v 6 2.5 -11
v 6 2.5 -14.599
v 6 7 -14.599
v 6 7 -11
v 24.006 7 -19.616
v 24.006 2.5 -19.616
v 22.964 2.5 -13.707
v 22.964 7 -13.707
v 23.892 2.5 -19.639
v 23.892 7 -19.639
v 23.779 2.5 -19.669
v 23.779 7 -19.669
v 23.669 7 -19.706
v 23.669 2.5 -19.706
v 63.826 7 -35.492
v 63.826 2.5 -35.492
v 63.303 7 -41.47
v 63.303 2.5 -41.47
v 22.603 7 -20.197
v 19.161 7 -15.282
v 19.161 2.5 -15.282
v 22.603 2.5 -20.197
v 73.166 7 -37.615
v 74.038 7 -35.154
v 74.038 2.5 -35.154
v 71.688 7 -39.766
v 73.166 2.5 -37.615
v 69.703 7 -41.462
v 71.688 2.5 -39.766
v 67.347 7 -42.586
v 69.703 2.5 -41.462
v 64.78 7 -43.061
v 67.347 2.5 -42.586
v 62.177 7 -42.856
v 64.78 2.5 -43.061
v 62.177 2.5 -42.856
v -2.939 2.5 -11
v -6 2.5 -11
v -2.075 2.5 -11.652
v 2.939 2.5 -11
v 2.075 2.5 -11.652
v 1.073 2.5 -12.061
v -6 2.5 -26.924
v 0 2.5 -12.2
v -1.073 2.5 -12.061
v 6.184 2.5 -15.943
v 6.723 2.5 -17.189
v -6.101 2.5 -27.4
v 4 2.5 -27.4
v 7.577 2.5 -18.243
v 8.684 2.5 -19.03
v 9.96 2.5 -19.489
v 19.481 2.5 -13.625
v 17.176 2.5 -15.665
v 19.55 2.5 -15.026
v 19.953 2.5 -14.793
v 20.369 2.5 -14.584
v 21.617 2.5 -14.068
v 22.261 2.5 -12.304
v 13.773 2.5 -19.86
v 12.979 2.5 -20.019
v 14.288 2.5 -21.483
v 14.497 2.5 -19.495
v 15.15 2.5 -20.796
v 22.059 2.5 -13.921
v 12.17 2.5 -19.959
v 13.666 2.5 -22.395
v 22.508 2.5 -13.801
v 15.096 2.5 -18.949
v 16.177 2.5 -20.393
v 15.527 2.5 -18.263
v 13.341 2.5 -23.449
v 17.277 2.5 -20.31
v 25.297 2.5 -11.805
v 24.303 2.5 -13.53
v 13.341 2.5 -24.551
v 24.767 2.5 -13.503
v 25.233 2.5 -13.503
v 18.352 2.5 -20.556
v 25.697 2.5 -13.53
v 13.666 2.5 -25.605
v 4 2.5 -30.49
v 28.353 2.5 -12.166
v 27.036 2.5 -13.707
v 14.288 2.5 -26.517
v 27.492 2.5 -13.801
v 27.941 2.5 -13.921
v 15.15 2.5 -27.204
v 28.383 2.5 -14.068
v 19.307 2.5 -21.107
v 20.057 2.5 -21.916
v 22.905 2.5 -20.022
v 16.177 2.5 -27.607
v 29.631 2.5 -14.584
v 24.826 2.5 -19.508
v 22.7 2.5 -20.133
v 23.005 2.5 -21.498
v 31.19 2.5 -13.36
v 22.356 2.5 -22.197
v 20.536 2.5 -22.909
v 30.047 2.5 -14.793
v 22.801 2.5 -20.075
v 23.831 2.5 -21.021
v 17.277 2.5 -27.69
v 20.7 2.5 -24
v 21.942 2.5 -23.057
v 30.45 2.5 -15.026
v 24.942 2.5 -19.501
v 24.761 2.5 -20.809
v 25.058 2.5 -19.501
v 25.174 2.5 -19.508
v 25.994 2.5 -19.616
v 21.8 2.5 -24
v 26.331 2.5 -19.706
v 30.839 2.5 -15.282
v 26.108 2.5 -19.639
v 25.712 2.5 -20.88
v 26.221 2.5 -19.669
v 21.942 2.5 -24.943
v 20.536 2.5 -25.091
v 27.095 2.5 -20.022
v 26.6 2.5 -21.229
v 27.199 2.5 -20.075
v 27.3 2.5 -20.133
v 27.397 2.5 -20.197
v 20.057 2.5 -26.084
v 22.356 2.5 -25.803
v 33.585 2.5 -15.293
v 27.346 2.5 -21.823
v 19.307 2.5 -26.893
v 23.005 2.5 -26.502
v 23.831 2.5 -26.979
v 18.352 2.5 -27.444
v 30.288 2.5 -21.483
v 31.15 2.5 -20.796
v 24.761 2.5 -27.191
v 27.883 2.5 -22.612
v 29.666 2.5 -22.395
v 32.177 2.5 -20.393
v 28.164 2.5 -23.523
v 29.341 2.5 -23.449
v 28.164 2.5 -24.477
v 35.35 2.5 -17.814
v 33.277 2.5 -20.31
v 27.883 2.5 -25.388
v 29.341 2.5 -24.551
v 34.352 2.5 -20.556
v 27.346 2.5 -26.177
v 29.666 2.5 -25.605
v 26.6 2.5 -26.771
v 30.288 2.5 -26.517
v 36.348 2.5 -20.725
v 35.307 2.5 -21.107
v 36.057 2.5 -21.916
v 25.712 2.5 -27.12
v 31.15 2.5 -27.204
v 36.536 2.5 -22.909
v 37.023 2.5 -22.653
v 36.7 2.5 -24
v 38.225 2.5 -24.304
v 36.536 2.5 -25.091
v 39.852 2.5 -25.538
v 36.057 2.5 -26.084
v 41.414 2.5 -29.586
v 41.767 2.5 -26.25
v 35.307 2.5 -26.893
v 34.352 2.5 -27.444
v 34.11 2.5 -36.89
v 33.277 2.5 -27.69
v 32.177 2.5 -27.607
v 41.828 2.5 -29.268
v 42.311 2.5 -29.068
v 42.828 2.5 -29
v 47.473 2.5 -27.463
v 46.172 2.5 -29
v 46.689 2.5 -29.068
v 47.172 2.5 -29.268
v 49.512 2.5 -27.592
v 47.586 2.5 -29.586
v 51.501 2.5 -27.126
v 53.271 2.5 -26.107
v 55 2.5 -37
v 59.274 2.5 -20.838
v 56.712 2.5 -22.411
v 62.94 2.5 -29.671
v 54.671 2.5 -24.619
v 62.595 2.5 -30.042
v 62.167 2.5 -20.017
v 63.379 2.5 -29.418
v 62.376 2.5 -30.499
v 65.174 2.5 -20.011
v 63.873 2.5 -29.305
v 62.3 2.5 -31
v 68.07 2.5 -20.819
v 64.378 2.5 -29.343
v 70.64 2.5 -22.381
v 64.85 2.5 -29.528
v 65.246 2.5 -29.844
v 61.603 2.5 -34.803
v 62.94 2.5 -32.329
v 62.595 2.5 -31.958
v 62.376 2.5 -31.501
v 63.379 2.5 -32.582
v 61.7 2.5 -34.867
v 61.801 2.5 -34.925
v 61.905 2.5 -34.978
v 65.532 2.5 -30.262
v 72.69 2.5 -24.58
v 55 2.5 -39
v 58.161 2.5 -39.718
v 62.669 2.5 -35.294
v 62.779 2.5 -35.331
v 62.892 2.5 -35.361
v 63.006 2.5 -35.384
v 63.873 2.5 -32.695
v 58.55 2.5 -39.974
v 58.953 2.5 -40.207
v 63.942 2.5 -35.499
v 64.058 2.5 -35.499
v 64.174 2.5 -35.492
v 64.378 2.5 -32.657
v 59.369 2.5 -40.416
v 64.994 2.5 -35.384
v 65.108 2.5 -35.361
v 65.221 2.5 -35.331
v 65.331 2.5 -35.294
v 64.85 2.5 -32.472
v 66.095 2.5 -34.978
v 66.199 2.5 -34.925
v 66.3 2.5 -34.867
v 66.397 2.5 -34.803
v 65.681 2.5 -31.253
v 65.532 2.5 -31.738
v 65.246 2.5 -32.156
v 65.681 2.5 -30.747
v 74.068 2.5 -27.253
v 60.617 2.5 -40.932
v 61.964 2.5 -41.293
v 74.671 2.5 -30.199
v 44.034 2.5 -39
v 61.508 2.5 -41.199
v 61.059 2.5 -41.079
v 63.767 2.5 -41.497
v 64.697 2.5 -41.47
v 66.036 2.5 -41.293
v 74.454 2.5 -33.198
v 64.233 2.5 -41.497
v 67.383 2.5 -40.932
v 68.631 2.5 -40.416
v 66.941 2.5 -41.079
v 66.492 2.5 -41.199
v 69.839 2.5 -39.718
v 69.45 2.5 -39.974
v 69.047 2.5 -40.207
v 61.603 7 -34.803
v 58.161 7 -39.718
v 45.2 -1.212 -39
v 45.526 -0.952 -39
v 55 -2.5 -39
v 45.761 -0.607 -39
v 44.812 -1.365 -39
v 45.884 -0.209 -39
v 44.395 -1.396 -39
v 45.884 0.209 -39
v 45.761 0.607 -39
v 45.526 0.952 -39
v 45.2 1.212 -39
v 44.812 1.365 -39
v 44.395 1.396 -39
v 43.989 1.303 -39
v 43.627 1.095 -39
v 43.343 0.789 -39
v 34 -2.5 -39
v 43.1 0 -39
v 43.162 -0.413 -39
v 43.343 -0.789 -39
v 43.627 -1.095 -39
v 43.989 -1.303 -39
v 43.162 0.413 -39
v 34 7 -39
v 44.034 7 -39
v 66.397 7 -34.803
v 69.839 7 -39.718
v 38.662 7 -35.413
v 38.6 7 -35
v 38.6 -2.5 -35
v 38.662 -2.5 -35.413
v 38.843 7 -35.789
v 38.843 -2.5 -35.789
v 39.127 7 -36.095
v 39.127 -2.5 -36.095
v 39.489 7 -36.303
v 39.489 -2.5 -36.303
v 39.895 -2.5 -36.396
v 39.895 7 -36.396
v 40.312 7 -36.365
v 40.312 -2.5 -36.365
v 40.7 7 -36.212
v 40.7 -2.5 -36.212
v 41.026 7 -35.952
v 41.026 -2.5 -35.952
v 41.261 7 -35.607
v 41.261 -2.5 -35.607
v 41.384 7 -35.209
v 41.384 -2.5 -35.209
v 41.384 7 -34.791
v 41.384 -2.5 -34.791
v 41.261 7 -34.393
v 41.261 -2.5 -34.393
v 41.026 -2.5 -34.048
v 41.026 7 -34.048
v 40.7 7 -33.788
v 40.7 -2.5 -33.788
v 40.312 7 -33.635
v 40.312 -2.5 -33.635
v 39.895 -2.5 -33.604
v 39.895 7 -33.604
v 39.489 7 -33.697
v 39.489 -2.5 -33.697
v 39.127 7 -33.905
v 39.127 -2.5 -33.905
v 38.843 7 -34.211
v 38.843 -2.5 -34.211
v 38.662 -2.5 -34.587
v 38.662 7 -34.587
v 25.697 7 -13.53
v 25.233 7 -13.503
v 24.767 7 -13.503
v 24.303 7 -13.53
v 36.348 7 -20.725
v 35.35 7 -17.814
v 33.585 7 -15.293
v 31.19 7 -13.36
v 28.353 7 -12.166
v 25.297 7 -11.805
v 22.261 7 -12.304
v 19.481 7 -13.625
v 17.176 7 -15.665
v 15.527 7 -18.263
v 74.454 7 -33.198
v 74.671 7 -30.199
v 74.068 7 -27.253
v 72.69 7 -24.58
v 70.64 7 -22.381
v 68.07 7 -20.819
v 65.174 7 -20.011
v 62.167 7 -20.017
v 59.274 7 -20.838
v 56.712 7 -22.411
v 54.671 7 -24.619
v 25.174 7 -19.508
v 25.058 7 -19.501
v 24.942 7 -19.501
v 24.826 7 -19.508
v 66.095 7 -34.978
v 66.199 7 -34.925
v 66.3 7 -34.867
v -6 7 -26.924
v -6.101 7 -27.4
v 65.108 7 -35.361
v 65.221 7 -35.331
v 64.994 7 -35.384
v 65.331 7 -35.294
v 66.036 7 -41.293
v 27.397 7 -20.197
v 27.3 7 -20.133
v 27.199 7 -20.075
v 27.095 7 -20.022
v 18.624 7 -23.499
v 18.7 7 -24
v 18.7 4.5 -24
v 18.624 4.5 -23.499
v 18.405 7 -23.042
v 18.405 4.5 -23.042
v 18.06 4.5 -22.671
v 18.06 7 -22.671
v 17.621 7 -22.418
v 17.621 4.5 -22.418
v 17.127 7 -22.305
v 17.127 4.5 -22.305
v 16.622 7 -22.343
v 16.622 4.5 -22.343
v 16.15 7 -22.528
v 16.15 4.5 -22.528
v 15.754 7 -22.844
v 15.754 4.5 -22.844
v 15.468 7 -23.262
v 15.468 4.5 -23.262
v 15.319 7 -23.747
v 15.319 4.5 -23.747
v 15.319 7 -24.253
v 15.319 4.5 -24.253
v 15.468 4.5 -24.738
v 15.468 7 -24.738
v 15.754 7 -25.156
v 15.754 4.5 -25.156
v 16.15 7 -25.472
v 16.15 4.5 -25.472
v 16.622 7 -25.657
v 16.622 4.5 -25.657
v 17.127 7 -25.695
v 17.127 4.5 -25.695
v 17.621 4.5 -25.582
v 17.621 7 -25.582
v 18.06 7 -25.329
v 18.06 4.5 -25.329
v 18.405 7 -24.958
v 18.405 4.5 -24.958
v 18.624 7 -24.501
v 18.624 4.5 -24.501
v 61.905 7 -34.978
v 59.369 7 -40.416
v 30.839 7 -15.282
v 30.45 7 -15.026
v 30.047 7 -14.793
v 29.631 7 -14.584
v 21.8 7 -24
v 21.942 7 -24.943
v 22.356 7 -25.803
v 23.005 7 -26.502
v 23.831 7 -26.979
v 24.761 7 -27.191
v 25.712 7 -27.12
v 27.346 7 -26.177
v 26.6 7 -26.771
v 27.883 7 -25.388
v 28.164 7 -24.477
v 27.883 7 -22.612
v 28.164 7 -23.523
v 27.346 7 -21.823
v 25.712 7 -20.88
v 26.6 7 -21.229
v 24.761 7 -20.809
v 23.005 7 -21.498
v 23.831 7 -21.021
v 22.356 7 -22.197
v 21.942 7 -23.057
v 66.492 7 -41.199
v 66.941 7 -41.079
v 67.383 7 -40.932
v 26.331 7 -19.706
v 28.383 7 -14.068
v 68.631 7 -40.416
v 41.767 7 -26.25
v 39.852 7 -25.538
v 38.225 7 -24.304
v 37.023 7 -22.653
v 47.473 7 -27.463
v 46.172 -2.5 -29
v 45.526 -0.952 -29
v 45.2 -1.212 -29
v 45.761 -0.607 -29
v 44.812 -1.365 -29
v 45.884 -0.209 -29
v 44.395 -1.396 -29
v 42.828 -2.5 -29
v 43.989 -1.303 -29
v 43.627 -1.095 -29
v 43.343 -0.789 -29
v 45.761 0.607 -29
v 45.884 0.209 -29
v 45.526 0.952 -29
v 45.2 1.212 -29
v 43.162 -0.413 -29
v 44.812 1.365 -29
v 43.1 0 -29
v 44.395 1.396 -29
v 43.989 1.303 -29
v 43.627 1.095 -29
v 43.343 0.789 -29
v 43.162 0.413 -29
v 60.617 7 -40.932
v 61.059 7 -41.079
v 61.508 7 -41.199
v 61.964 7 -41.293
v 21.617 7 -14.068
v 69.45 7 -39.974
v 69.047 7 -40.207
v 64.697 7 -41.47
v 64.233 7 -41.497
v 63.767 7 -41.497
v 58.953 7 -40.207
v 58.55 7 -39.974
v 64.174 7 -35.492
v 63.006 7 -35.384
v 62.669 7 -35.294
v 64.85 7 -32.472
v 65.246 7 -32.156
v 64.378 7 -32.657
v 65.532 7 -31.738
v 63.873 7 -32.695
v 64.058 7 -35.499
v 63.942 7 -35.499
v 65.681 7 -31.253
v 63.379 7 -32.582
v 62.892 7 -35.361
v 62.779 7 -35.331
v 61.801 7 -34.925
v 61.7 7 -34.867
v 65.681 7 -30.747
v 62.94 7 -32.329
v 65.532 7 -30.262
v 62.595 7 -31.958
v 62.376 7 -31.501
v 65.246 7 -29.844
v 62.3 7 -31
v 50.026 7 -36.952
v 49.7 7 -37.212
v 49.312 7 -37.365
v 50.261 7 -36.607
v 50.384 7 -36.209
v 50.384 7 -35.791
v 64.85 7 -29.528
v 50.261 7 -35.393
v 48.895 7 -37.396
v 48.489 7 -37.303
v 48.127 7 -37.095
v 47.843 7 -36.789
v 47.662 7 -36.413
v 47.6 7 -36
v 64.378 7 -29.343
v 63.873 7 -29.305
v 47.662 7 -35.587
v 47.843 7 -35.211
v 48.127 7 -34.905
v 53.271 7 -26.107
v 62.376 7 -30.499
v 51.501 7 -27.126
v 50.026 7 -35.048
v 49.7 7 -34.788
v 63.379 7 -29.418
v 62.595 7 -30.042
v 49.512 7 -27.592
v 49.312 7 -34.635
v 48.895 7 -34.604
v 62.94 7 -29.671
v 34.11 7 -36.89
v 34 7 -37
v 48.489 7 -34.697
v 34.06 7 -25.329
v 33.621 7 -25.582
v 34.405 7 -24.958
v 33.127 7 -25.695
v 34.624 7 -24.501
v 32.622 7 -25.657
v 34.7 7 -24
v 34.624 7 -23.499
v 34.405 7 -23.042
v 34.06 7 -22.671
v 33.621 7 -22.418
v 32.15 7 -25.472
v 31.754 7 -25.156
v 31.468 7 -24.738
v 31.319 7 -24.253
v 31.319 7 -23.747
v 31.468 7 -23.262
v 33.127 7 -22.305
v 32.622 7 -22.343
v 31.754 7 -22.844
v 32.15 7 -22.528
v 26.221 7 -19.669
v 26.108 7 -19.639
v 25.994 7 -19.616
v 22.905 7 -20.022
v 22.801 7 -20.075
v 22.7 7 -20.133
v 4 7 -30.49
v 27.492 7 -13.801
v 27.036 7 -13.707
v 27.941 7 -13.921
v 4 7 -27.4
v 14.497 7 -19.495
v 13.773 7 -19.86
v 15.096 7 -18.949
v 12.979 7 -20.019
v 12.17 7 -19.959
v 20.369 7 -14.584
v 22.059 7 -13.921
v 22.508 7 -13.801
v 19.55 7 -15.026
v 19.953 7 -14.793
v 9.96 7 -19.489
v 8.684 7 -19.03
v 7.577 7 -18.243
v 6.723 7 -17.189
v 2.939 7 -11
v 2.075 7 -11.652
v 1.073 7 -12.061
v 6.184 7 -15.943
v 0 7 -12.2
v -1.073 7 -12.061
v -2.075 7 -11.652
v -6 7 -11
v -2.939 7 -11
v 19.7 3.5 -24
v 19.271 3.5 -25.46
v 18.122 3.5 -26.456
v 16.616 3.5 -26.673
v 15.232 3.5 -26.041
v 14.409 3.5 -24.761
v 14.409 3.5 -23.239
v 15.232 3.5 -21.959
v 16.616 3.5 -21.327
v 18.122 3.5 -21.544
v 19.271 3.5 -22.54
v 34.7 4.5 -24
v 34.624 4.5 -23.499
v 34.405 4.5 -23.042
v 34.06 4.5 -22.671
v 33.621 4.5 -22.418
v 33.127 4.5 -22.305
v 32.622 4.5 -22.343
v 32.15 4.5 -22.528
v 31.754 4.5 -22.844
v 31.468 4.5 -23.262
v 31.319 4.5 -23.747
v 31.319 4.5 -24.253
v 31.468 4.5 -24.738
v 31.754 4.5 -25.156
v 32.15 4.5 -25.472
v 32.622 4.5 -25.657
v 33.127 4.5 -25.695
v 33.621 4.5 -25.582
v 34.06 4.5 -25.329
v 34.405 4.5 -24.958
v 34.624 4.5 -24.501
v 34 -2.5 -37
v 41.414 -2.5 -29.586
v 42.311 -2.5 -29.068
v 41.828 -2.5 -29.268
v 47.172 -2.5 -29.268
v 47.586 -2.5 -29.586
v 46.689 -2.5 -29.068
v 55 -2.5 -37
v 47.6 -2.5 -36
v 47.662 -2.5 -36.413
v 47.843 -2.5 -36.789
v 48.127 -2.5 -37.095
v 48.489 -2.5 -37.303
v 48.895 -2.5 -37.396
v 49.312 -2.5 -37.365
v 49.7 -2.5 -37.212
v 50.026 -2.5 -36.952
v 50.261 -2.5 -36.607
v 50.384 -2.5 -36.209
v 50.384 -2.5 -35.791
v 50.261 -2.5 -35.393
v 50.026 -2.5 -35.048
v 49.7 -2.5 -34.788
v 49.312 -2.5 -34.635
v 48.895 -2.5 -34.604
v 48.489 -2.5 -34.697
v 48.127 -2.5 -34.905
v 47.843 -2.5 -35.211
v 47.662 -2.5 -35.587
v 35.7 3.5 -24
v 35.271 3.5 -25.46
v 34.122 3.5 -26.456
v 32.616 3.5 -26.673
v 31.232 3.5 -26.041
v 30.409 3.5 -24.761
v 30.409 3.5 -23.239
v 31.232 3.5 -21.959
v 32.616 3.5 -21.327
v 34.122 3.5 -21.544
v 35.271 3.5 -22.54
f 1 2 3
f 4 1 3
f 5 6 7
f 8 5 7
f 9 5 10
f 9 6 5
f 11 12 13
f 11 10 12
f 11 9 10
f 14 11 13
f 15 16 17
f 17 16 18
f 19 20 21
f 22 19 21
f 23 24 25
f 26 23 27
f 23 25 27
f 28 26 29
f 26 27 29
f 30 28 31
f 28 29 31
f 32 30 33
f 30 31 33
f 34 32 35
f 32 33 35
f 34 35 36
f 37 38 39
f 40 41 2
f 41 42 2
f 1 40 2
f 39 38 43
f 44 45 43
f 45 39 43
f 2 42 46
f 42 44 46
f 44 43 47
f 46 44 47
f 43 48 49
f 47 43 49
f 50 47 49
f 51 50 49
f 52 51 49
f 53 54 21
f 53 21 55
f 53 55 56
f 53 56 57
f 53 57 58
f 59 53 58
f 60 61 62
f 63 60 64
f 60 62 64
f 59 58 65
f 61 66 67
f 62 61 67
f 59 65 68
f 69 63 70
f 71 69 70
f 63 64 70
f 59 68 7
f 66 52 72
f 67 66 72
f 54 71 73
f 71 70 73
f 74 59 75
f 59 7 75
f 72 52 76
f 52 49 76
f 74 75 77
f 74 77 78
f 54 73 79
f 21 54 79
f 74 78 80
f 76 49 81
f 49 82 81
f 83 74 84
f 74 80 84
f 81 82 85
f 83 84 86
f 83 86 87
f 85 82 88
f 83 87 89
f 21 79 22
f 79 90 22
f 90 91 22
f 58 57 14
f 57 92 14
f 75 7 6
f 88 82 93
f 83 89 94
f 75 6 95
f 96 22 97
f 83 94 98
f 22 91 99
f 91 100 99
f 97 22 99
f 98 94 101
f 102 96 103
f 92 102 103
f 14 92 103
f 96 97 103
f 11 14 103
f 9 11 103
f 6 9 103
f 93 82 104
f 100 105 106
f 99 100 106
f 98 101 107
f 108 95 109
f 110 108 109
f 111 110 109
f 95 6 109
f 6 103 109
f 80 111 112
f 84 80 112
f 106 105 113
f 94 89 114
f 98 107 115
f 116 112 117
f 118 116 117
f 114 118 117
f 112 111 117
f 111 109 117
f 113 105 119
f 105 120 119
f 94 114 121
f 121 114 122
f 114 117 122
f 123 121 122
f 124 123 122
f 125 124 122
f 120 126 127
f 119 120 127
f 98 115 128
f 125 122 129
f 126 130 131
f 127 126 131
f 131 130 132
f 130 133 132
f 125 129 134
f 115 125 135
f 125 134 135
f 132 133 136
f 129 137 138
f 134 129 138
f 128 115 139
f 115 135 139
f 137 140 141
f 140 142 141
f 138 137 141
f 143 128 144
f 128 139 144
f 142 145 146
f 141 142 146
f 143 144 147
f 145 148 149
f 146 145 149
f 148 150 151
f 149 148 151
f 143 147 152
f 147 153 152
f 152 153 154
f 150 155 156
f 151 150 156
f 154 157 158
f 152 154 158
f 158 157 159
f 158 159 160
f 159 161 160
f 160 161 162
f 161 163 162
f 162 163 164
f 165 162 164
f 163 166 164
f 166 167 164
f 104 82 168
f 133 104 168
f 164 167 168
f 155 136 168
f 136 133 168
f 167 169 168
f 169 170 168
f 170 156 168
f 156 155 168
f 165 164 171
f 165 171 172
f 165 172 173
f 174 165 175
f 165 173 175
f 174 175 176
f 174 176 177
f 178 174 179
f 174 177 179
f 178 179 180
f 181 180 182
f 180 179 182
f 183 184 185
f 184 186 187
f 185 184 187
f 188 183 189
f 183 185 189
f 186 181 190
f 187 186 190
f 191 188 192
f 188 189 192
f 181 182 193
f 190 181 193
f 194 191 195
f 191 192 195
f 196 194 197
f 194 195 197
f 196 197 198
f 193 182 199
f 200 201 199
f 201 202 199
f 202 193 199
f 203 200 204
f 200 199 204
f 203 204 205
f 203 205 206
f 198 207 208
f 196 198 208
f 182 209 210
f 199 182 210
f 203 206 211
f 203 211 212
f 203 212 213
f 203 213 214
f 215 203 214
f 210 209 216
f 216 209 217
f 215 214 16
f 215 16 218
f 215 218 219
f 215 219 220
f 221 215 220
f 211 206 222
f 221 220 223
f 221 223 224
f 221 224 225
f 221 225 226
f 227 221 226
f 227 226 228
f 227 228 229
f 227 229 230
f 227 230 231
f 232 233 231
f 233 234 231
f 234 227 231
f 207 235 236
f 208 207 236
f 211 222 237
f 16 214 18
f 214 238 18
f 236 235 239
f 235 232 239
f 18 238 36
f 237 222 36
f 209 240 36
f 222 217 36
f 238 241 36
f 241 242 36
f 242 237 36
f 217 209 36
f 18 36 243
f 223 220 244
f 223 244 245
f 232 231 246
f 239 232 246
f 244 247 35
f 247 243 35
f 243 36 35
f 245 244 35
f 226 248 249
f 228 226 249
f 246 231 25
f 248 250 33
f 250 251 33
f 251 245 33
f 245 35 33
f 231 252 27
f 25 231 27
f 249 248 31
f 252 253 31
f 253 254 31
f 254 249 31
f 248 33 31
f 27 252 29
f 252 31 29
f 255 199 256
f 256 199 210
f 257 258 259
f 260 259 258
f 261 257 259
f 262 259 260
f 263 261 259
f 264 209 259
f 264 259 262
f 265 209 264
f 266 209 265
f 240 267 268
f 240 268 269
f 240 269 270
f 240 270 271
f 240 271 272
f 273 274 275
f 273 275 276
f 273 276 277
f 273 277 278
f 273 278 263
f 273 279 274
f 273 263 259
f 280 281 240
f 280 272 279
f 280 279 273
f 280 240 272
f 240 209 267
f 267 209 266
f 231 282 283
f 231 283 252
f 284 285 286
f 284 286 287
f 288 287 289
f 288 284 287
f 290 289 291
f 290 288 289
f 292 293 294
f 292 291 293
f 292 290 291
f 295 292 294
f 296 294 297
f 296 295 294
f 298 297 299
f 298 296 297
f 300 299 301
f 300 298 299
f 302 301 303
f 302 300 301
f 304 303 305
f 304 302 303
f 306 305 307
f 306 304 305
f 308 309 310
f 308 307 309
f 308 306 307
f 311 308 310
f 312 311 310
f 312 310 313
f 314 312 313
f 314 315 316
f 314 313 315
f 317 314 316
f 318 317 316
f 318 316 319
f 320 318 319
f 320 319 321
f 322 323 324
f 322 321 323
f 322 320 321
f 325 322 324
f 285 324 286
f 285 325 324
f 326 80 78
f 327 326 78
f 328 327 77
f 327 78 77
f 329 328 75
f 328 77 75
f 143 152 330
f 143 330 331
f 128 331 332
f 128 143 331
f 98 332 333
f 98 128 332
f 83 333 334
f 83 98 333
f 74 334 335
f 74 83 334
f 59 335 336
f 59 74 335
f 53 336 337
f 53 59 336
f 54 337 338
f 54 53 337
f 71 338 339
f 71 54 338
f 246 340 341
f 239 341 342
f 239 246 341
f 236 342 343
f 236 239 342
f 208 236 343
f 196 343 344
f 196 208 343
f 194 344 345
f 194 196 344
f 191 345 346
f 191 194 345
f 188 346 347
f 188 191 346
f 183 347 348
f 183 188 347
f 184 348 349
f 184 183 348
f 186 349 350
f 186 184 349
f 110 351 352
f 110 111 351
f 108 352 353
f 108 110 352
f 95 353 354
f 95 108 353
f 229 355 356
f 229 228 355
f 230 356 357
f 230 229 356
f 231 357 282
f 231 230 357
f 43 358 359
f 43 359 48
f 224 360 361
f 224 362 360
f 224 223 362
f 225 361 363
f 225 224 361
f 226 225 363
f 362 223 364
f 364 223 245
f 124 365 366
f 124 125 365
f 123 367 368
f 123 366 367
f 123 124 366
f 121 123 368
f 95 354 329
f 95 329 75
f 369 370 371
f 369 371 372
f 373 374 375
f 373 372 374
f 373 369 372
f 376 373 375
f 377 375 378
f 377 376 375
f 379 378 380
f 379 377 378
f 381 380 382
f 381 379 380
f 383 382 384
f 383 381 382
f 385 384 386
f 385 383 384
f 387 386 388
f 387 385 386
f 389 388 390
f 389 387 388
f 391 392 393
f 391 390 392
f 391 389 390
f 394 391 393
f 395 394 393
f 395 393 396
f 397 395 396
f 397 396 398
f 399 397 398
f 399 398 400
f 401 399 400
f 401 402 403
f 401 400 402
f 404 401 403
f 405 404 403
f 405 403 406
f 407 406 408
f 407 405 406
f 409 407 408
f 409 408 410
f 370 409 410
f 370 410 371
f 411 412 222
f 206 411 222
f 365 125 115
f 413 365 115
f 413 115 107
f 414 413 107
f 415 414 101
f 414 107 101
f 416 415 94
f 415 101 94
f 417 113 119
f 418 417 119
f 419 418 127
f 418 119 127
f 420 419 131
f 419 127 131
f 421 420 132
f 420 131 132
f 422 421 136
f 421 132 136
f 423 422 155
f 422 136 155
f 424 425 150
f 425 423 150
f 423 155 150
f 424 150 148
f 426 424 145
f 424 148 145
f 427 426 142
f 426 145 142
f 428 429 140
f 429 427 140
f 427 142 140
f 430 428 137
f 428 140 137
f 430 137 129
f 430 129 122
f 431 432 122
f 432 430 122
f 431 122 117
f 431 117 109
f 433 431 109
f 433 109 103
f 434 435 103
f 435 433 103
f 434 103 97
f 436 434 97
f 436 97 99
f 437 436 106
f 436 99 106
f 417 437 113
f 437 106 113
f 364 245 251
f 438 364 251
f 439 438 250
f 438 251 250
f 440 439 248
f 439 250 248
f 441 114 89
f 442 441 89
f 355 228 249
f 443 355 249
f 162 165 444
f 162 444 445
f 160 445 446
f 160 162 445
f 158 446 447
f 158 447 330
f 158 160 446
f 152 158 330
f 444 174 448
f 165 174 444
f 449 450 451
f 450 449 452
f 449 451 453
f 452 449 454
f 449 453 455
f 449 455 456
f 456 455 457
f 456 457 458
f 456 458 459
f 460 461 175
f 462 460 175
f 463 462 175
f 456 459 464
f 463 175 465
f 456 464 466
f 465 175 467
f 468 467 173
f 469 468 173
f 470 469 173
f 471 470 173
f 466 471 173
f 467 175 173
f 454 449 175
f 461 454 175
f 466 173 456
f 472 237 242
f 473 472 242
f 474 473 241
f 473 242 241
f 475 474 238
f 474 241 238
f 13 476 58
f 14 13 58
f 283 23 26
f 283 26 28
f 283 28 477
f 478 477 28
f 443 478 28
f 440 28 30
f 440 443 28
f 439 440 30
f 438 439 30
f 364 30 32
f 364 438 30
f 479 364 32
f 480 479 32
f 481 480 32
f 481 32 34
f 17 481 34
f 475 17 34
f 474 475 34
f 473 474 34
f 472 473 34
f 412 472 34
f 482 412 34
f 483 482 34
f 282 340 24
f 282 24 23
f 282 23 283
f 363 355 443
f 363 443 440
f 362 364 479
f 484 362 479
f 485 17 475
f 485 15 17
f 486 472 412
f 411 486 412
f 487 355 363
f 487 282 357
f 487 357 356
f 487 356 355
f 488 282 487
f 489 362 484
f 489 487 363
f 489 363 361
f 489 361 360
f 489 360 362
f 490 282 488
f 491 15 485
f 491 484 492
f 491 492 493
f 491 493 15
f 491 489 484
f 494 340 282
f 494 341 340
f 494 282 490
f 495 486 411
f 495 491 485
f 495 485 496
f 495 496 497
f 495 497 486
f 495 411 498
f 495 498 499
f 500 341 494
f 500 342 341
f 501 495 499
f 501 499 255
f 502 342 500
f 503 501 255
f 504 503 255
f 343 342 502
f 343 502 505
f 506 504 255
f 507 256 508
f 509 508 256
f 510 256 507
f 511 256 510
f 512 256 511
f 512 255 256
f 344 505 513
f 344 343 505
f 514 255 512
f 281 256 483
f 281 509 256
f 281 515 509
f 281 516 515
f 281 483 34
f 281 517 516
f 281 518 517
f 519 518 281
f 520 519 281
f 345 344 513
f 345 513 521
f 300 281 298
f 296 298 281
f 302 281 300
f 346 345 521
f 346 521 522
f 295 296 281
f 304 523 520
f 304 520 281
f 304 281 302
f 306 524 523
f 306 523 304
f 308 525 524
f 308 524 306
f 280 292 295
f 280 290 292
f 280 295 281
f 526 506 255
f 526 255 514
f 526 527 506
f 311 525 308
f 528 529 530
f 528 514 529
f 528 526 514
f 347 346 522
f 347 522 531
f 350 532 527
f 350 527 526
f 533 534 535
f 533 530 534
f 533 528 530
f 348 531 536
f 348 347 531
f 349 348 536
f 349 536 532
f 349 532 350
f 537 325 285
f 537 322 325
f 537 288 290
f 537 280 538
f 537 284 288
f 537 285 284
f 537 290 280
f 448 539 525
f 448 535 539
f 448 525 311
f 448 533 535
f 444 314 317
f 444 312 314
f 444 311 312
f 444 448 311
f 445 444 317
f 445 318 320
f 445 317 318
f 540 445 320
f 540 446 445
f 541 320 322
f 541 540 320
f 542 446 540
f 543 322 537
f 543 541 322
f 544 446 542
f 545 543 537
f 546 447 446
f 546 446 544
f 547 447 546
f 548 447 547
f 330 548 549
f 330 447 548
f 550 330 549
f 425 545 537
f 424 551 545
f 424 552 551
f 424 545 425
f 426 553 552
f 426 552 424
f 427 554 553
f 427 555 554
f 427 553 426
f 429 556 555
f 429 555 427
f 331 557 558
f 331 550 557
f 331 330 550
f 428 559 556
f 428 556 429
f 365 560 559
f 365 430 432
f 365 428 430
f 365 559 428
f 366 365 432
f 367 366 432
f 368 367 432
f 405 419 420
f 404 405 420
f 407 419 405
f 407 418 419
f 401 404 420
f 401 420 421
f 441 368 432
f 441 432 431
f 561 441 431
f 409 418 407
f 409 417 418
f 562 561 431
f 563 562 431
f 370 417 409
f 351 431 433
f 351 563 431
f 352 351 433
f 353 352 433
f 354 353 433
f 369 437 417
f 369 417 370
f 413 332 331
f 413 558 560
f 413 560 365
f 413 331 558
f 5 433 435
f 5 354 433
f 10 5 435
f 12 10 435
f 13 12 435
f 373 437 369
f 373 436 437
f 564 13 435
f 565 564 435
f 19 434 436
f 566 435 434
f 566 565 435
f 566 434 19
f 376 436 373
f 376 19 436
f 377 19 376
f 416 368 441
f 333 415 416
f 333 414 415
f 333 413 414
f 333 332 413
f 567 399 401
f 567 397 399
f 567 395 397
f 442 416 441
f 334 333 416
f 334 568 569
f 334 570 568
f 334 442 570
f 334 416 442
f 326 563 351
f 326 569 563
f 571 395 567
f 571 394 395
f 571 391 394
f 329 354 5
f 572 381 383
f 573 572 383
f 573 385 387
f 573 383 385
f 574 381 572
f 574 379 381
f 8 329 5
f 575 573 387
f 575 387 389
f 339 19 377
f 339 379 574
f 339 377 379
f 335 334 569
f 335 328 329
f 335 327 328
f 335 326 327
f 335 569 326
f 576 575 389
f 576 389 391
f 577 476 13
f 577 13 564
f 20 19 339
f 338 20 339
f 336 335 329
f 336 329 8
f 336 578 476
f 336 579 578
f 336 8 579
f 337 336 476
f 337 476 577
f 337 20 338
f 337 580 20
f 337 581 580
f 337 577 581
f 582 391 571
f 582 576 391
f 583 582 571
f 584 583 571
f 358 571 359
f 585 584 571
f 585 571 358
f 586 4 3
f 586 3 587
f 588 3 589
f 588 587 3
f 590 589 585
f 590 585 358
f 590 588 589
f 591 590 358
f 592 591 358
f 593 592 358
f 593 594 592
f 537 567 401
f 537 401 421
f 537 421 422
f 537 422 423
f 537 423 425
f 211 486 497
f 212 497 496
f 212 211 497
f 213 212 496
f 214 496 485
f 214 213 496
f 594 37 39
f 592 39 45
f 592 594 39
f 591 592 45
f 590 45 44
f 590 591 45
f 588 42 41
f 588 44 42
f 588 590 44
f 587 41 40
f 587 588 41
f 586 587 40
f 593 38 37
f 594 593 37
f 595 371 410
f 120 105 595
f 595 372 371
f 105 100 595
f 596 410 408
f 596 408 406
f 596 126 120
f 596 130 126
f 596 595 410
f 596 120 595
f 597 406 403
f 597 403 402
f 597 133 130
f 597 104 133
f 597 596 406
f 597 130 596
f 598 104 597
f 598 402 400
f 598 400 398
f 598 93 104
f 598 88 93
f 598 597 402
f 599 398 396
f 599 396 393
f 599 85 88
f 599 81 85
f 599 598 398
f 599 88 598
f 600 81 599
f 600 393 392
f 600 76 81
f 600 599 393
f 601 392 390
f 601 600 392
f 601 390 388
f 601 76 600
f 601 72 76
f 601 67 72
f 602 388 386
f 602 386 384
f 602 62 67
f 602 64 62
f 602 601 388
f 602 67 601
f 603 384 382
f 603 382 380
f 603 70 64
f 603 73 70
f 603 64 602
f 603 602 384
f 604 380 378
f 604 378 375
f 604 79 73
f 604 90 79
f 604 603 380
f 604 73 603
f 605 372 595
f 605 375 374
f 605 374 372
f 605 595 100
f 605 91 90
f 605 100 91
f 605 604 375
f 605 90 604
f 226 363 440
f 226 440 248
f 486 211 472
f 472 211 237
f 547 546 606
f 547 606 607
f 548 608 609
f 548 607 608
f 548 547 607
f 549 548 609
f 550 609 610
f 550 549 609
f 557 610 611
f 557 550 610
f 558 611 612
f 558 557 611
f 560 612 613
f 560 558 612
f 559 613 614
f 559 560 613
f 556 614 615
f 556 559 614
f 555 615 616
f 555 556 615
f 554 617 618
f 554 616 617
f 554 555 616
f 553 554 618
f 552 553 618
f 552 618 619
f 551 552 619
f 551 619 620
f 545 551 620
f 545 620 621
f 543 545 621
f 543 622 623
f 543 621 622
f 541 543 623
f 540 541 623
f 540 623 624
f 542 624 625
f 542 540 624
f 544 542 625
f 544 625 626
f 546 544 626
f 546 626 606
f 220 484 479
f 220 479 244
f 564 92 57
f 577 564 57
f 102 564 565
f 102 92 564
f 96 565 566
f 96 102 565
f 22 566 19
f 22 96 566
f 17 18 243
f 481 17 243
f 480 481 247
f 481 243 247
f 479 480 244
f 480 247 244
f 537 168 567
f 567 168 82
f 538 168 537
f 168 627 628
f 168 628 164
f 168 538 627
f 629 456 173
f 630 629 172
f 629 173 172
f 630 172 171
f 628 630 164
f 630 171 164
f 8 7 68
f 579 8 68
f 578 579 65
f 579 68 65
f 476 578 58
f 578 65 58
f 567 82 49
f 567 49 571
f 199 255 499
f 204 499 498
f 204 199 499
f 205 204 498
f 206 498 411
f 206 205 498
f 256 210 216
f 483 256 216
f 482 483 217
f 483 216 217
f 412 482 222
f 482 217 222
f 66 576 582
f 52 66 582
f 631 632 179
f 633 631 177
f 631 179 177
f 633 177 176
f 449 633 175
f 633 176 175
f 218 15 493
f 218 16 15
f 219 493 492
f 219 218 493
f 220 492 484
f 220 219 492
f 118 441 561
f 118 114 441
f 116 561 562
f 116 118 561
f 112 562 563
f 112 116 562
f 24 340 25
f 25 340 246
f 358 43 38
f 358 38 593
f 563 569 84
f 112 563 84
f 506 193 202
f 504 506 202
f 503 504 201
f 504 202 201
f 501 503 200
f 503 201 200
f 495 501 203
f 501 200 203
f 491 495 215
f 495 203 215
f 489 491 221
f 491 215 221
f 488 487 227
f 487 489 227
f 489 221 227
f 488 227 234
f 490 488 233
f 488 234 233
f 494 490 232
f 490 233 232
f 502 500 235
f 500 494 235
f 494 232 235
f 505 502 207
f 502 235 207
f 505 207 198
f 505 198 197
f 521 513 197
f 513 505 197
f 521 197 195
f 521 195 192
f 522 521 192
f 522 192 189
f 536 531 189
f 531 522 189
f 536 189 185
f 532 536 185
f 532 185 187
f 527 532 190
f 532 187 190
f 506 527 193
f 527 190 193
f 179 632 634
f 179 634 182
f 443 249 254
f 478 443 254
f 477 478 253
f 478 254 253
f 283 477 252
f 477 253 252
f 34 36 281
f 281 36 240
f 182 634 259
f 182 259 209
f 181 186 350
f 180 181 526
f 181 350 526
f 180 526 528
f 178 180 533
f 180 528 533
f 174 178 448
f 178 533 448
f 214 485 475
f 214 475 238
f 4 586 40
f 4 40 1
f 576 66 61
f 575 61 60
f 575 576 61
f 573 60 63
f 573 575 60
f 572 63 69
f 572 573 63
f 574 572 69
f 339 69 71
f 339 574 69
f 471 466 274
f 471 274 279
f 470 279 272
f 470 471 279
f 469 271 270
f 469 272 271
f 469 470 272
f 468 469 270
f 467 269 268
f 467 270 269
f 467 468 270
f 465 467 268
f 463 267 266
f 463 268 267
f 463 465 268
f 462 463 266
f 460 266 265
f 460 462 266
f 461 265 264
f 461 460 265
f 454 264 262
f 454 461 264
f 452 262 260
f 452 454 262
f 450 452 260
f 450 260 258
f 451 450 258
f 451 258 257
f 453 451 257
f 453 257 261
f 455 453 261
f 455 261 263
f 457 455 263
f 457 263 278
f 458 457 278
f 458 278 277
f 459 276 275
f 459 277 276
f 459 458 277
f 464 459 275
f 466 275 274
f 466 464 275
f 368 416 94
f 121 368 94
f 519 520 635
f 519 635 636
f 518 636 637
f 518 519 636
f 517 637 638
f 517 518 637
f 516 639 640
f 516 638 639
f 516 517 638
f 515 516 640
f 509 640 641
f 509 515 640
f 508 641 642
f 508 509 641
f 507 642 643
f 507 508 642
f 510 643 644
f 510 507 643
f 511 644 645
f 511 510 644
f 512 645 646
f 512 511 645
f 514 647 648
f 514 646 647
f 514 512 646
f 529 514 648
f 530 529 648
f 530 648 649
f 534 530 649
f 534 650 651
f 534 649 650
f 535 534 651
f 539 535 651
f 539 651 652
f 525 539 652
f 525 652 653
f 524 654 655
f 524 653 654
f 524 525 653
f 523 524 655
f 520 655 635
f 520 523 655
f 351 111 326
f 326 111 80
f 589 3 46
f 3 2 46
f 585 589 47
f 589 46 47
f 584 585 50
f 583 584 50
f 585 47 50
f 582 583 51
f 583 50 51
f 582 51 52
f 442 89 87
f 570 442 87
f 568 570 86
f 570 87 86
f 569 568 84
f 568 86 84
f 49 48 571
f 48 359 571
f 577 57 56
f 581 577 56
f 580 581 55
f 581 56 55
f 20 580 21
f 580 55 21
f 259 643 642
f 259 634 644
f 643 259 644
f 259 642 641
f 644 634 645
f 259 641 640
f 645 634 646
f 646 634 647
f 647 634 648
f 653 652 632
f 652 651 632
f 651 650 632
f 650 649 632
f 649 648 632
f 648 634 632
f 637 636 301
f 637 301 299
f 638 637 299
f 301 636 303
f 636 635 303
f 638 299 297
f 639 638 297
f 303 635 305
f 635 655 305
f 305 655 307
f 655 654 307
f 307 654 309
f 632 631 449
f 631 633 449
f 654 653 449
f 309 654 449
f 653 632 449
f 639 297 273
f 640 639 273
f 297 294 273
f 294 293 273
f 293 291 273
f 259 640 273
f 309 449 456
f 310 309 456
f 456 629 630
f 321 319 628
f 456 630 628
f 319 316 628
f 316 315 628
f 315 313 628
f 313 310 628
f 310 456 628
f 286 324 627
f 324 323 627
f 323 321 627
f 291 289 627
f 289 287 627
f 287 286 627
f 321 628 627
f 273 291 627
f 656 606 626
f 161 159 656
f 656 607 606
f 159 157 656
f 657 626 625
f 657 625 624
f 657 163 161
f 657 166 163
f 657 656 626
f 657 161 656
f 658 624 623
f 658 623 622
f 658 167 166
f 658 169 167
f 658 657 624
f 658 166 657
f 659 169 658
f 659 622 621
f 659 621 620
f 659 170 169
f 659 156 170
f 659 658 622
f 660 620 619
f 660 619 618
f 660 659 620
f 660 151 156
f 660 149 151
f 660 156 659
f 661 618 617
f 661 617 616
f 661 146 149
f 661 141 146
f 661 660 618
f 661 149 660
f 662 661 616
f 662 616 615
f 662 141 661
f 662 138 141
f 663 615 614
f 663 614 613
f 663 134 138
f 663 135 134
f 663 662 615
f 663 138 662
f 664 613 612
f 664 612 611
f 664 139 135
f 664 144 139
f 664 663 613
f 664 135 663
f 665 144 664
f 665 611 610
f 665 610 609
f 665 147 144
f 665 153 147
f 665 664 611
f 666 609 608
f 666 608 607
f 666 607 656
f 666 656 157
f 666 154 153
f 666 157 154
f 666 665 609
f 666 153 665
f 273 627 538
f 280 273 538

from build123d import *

# Parameters (mm, degrees)
CYLINDER071_R             = 1.7
CYLINDER071_DEPTH         = 10
CYLINDER071_ROLL_ANGLE    = 90
CYLINDER070_R             = 1.7
CYLINDER070_DEPTH         = 10
CYLINDER070_ROLL_ANGLE    = 90
BOX001027009_W            = 15
BOX001027009_H            = 24
BOX001027009_DEPTH        = 10.6
CYLINDER067_R             = 4.2
CYLINDER067_DEPTH         = 18
CYLINDER067_ROLL_ANGLE    = 90
BOX001027007_W            = 12
BOX001027007_H            = 4.5
BOX001027007_DEPTH        = 17
CYLINDER053_R             = 1.4
CYLINDER053_DEPTH         = 20
CYLINDER053_ROLL_ANGLE    = 90
CYLINDER052_R             = 1.4
CYLINDER052_DEPTH         = 20
CYLINDER052_ROLL_ANGLE    = 90
CYLINDER049_R             = 1.4
CYLINDER049_DEPTH         = 30
BOX001019_W               = 100
BOX001019_H               = 22
BOX001019_DEPTH           = 40
CYLINDER046_R             = 3.2
CYLINDER046_DEPTH         = 20
CYLINDER046_ROLL_ANGLE    = 90
BOX001018_W               = 2
BOX001018_H               = 20
BOX001018_DEPTH           = 13
CYLINDER047_R             = 2
CYLINDER047_DEPTH         = 26
CYLINDER047_ROLL_ANGLE    = 90
CYLINDER048_R             = 8
CYLINDER048_DEPTH         = 18
CYLINDER048_ROLL_ANGLE    = 90
BOX001017_W               = 13
BOX001017_H               = 20
BOX001017_DEPTH           = 2
BOX001017_PLACEMENT_ANGLE = 80
COMMON013_PITCH_ANGLE     = 10
COMMON014_PLACEMENT_ANGLE = 25
COMMON015_PITCH_ANGLE     = -20
COMMON016_PITCH_ANGLE     = -35
COMMON012_PITCH_ANGLE     = -5
FUSION064_PLACEMENT_ANGLE = 180
CYLINDER045_R             = 1.7
CYLINDER045_DEPTH         = 20
CYLINDER045_ROLL_ANGLE    = 90
CYLINDER043_R             = 11
CYLINDER043_DEPTH         = 14
CYLINDER043_ROLL_ANGLE    = 90
BOX001016_W               = 80
BOX001016_H               = 14
BOX001016_DEPTH           = 12
CYLINDER044_R             = 11
CYLINDER044_DEPTH         = 14
CYLINDER044_ROLL_ANGLE    = 90
FILLET003_R               = 10
FILLET003_PITCH_ANGLE     = 12
FILLET005_R               = 7
FILLET006_R               = 7
BOX001020_W               = 21
BOX001020_H               = 9.5
BOX001020_DEPTH           = 10
CHAMFER001_SIZE           = 8
FILLET004_R               = 2
CUT020_PLACEMENT_ANGLE    = 180
FILLET008_R               = 5
FILLET010_R               = 3
CHAMFER004_SIZE           = 2


with BuildPart() as cylinder067:
    # Cylinder071 → Cylinder071 (new body)
    with BuildSketch(Plane.XY):
        Circle(CYLINDER071_R)
    extrude(amount=CYLINDER071_DEPTH)


with BuildPart() as cylinder067_1:
    # Cylinder071 roll: moved
    add(cylinder067.part.rotate(Axis((0, 0, 0), (1, 0, 0)), CYLINDER071_ROLL_ANGLE))


with BuildPart() as cylinder067_2:
    # Cylinder071 placement: moved
    add(cylinder067_1.part.moved(Location((33, 10, -24))))


with BuildPart() as mounting_holes:
    # Cylinder070 → Cylinder070 (new body)
    with BuildSketch(Plane.XY):
        Circle(CYLINDER070_R)
    extrude(amount=CYLINDER070_DEPTH)


with BuildPart() as mounting_holes_1:
    # Cylinder070 roll: moved
    add(mounting_holes.part.rotate(Axis((0, 0, 0), (1, 0, 0)), CYLINDER070_ROLL_ANGLE))


with BuildPart() as mounting_holes_2:
    # Cylinder070 placement: moved
    add(mounting_holes_1.part.moved(Location((17, 10, -24))))

    # Fusion084: union Cylinder067
    add(cylinder067_2.part)


with BuildPart() as cube029:
    # Box001027009 → Box001027009 (new body)
    with BuildSketch(Plane(origin=(-11, -13, -38), x_dir=(1, 0, 0), z_dir=(0, 0, 1))):
        with Locations((7.5, 12)):
            Rectangle(BOX001027009_W, BOX001027009_H)
    extrude(amount=BOX001027009_DEPTH)


with BuildPart() as cylinder067_body:
    # Cylinder067 → Cylinder067 (new body)
    with BuildSketch(Plane.XY):
        Circle(CYLINDER067_R)
    extrude(amount=CYLINDER067_DEPTH)


with BuildPart() as cylinder067_body_1:
    # Cylinder067 roll: moved
    add(cylinder067_body.part.rotate(Axis((0, 0, 0), (1, 0, 0)), CYLINDER067_ROLL_ANGLE))


with BuildPart() as cylinder067_body_2:
    # Cylinder067 placement: moved
    add(cylinder067_body_1.part.moved(Location((0, 9, -8))))


with BuildPart() as cube027:
    # Box001027007 → Box001027007 (new body)
    with BuildSketch(Plane(origin=(-6, 2.5, -28), x_dir=(1, 0, 0), z_dir=(0, 0, 1))):
        with Locations((6, 2.25)):
            Rectangle(BOX001027007_W, BOX001027007_H)
    extrude(amount=BOX001027007_DEPTH)


with BuildPart() as cylinder053:
    # Cylinder053 → Cylinder053 (new body)
    with BuildSketch(Plane.XY):
        Circle(CYLINDER053_R)
    extrude(amount=CYLINDER053_DEPTH)


with BuildPart() as cylinder053_1:
    # Cylinder053 roll: moved
    add(cylinder053.part.rotate(Axis((0, 0, 0), (1, 0, 0)), CYLINDER053_ROLL_ANGLE))


with BuildPart() as cylinder053_2:
    # Cylinder053 placement: moved
    add(cylinder053_1.part.moved(Location((35, 10, 19))))


with BuildPart() as fusion068:
    # Cylinder052 → Cylinder052 (new body)
    with BuildSketch(Plane.XY):
        Circle(CYLINDER052_R)
    extrude(amount=CYLINDER052_DEPTH)


with BuildPart() as fusion068_1:
    # Cylinder052 roll: moved
    add(fusion068.part.rotate(Axis((0, 0, 0), (1, 0, 0)), CYLINDER052_ROLL_ANGLE))


with BuildPart() as fusion068_2:
    # Cylinder052 placement: moved
    add(fusion068_1.part.moved(Location((26, 10, 20))))

    # Fusion068: union Cylinder053
    add(cylinder053_2.part)


with BuildPart() as cylinder049:
    # Cylinder049 → Cylinder049 (new body)
    with BuildSketch(Plane(origin=(30.5, 0, 0), x_dir=(1, 0, 0), z_dir=(0, 0, 1))):
        Circle(CYLINDER049_R)
    extrude(amount=CYLINDER049_DEPTH)


with BuildPart() as cube017:
    # Box001019 → Box001019 (new body)
    with BuildSketch(Plane(origin=(-2, -2.5, -8), x_dir=(1, 0, 0), z_dir=(0, 0, 1))):
        with Locations((50, 11)):
            Rectangle(BOX001019_W, BOX001019_H)
    extrude(amount=BOX001019_DEPTH)


with BuildPart() as cylinder046:
    # Cylinder046 → Cylinder046 (new body)
    with BuildSketch(Plane.XY):
        Circle(CYLINDER046_R)
    extrude(amount=CYLINDER046_DEPTH)


with BuildPart() as cylinder046_1:
    # Cylinder046 roll: moved
    add(cylinder046.part.rotate(Axis((0, 0, 0), (1, 0, 0)), CYLINDER046_ROLL_ANGLE))


with BuildPart() as cylinder046_2:
    # Cylinder046 placement: moved
    add(cylinder046_1.part.moved(Location((50, 10, 8))))


with BuildPart() as cube016:
    # Box001018 → Box001018 (new body)
    with BuildSketch(Plane(origin=(0, -10, 0), x_dir=(1, 0, 0), z_dir=(0, 0, 1))):
        with Locations((1, 10)):
            Rectangle(BOX001018_W, BOX001018_H)
    extrude(amount=BOX001018_DEPTH)


with BuildPart() as cylinder047:
    # Cylinder047 → Cylinder047 (new body)
    with BuildSketch(Plane.XY):
        Circle(CYLINDER047_R)
    extrude(amount=CYLINDER047_DEPTH)


with BuildPart() as cylinder047_1:
    # Cylinder047 roll: moved
    add(cylinder047.part.rotate(Axis((0, 0, 0), (1, 0, 0)), CYLINDER047_ROLL_ANGLE))


with BuildPart() as cylinder047_2:
    # Cylinder047 placement: moved
    add(cylinder047_1.part.moved(Location((0, 12, 0))))


with BuildPart() as cut014:
    # Cylinder048 → Cylinder048 (new body)
    with BuildSketch(Plane.XY):
        Circle(CYLINDER048_R)
    extrude(amount=CYLINDER048_DEPTH)


with BuildPart() as cut014_1:
    # Cylinder048 roll: moved
    add(cut014.part.rotate(Axis((0, 0, 0), (1, 0, 0)), CYLINDER048_ROLL_ANGLE))


with BuildPart() as cut014_2:
    # Cylinder048 placement: moved
    add(cut014_1.part.moved(Location((0, 9, 0))))

    # Cut014: cut Cylinder047
    add(cylinder047_2.part, mode=Mode.SUBTRACT)


with BuildPart() as cube015:
    # Box001017 → Box001017 (new body)
    with BuildSketch(Plane.XY):
        with Locations((6.5, 10)):
            Rectangle(BOX001017_W, BOX001017_H)
    extrude(amount=BOX001017_DEPTH)


with BuildPart() as cube015_1:
    # Box001017 placement: moved
    add(cube015.part.moved(Location((0, -10, 0))).rotate(Axis((0, -10, 0), (0, -1, 0)), BOX001017_PLACEMENT_ANGLE))


with BuildPart() as common013:
    # Common013 base: copy of Cube015
    add(cube015_1.part)

    # Common013: intersect Cube016, Cut014
    add(cube016.part, mode=Mode.INTERSECT)
    add(cut014_2.part, mode=Mode.INTERSECT)


with BuildPart() as common013_1:
    # Common013 pitch: moved
    add(common013.part.rotate(Axis((0, 0, 0), (0, 1, 0)), COMMON013_PITCH_ANGLE))


with BuildPart() as common013_2:
    # Common013 placement: moved
    add(common013_1.part.moved(Location((0.647048, 0, 2.414815))))


with BuildPart() as common014:
    # Common014 base: copy of Cube015
    add(cube015_1.part)

    # Common014: intersect Cube016, Cut014
    add(cube016.part, mode=Mode.INTERSECT)
    add(cut014_2.part, mode=Mode.INTERSECT)


with BuildPart() as common014_1:
    # Common014 placement: moved
    add(common014.part.moved(Location((1.25, 0, 2.165064))).rotate(Axis((1.25, 0, 2.165064), (0, 1, 0)), COMMON014_PLACEMENT_ANGLE))


with BuildPart() as common015:
    # Common015 base: copy of Cube015
    add(cube015_1.part)

    # Common015: intersect Cube016, Cut014
    add(cube016.part, mode=Mode.INTERSECT)
    add(cut014_2.part, mode=Mode.INTERSECT)


with BuildPart() as common015_1:
    # Common015 pitch: moved
    add(common015.part.rotate(Axis((0, 0, 0), (0, 1, 0)), COMMON015_PITCH_ANGLE))


with BuildPart() as common015_2:
    # Common015 placement: moved
    add(common015_1.part.moved(Location((-0.647048, 0, 2.414815))))


with BuildPart() as common016:
    # Common016 base: copy of Cube015
    add(cube015_1.part)

    # Common016: intersect Cube016, Cut014
    add(cube016.part, mode=Mode.INTERSECT)
    add(cut014_2.part, mode=Mode.INTERSECT)


with BuildPart() as common016_1:
    # Common016 pitch: moved
    add(common016.part.rotate(Axis((0, 0, 0), (0, 1, 0)), COMMON016_PITCH_ANGLE))


with BuildPart() as common016_2:
    # Common016 placement: moved
    add(common016_1.part.moved(Location((-1.25, 0, 2.165064))))


with BuildPart() as common012:
    # Common012 base: copy of Cube015
    add(cube015_1.part)

    # Common012: intersect Cube016, Cut014
    add(cube016.part, mode=Mode.INTERSECT)
    add(cut014_2.part, mode=Mode.INTERSECT)


with BuildPart() as common012_1:
    # Common012 pitch: moved
    add(common012.part.rotate(Axis((0, 0, 0), (0, 1, 0)), COMMON012_PITCH_ANGLE))


with BuildPart() as common012_2:
    # Common012 placement: moved
    add(common012_1.part.moved(Location((0, 0, 2.5))))


with BuildPart() as strength_slots002:
    # Fusion063 base: copy of Common012
    add(common012_2.part)

    # Fusion063: union Common013, Common014, Common015, Common016
    add(common013_2.part)
    add(common014_1.part)
    add(common015_2.part)
    add(common016_2.part)


with BuildPart() as strength_slots002_1:
    # Fusion063 placement: moved
    add(strength_slots002.part.moved(Location((11, 0, 15))))


with BuildPart() as strength_slots003:
    # Fusion064 base: copy of Common012
    add(common012_2.part)

    # Fusion064: union Common013, Common014, Common015, Common016
    add(common013_2.part)
    add(common014_1.part)
    add(common015_2.part)
    add(common016_2.part)


with BuildPart() as strength_slots003_1:
    # Fusion064 placement: moved
    add(strength_slots003.part.moved(Location((50, 0, 8))).rotate(Axis((50, 0, 8), (0, 1, 0)), FUSION064_PLACEMENT_ANGLE))


with BuildPart() as fusion065:
    # Cylinder045 → Cylinder045 (new body)
    with BuildSketch(Plane.XY):
        Circle(CYLINDER045_R)
    extrude(amount=CYLINDER045_DEPTH)


with BuildPart() as fusion065_1:
    # Cylinder045 roll: moved
    add(fusion065.part.rotate(Axis((0, 0, 0), (1, 0, 0)), CYLINDER045_ROLL_ANGLE))


with BuildPart() as fusion065_2:
    # Cylinder045 placement: moved
    add(fusion065_1.part.moved(Location((11, 10, 15))))

    # Fusion065: union Cylinder046, strength-slots002, strength-slots003
    add(cylinder046_2.part)
    add(strength_slots002_1.part)
    add(strength_slots003_1.part)


with BuildPart() as cylinder043:
    # Cylinder043 → Cylinder043 (new body)
    with BuildSketch(Plane.XY):
        Circle(CYLINDER043_R)
    extrude(amount=CYLINDER043_DEPTH)


with BuildPart() as cylinder043_1:
    # Cylinder043 roll: moved
    add(cylinder043.part.rotate(Axis((0, 0, 0), (1, 0, 0)), CYLINDER043_ROLL_ANGLE))


with BuildPart() as cylinder043_2:
    # Cylinder043 placement: moved
    add(cylinder043_1.part.moved(Location((11, 7, 12))))


with BuildPart() as cube014:
    # Box001016 → Box001016 (new body)
    with BuildSketch(Plane(origin=(0, -7, 12), x_dir=(1, 0, 0), z_dir=(0, 0, 1))):
        with Locations((40, 7)):
            Rectangle(BOX001016_W, BOX001016_H)
    extrude(amount=BOX001016_DEPTH)


with BuildPart() as cut017:
    # Cylinder044 → Cylinder044 (new body)
    with BuildSketch(Plane.XY):
        Circle(CYLINDER044_R)
    extrude(amount=CYLINDER044_DEPTH)


with BuildPart() as cut017_1:
    # Cylinder044 roll: moved
    add(cut017.part.rotate(Axis((0, 0, 0), (1, 0, 0)), CYLINDER044_ROLL_ANGLE))


with BuildPart() as cut017_2:
    # Cylinder044 placement: moved
    add(cut017_1.part.moved(Location((50, 7, 12))))

    # Fusion062: union Cylinder043, Cube014
    add(cylinder043_2.part)
    add(cube014.part)

    # Fillet003
    fillet003_edges = [cut017_2.edges().sort_by_distance(p)[0] for p in [
        (0, 0, 24),
    ]]
    fillet(fillet003_edges, radius=FILLET003_R)


with BuildPart() as cut017_3:
    # Fillet003 pitch: moved
    add(cut017_2.part.rotate(Axis((0, 0, 0), (0, 1, 0)), FILLET003_PITCH_ANGLE))


with BuildPart() as cut017_4:
    # Fillet003 placement: moved
    add(cut017_3.part.moved(Location((-1.94863, 0, 5.460021))))

    # Fillet005
    fillet005_edges = [cut017_4.edges().sort_by_distance(p)[0] for p in [
        (22.065557, 0, 12.623735),
    ]]
    fillet(fillet005_edges, radius=FILLET005_R)

    # Fillet006
    fillet006_edges = [cut017_4.edges().sort_by_distance(p)[0] for p in [
        (38.694066, 0, 9.089236),
    ]]
    fillet(fillet006_edges, radius=FILLET006_R)

    # Cut015: cut Fusion065
    add(fusion065_2.part, mode=Mode.SUBTRACT)

    # Cut017: cut Cube017
    add(cube017.part, mode=Mode.SUBTRACT)


with BuildPart() as part_mirroring004:
    # Part__Mirroring004: instance of Cut017
    add(cut017_4.part.mirror(Plane(origin=(0, 0, 0), x_dir=(1, 0, 0), z_dir=(0, 1, 0))))


with BuildPart() as cut_holder_basex:
    # Box001020 → Box001020 (new body)
    with BuildSketch(Plane(origin=(20, -2.5, 13), x_dir=(1, 0, 0), z_dir=(0, 0, 1))):
        with Locations((10.5, 4.75)):
            Rectangle(BOX001020_W, BOX001020_H)
    extrude(amount=BOX001020_DEPTH)

    # Chamfer001
    chamfer001_edges = [cut_holder_basex.edges().sort_by_distance(p)[0] for p in [
        (20, 2.25, 13),
        (41, 2.25, 13),
    ]]
    chamfer(chamfer001_edges, length=CHAMFER001_SIZE)

    # Fillet004
    fillet004_edges = [cut_holder_basex.edges().sort_by_distance(p)[0] for p in [
        (28, 2.25, 13),
        (33, 2.25, 13),
    ]]
    fillet(fillet004_edges, radius=FILLET004_R)

    # Fusion066: union Part__Mirroring004
    add(part_mirroring004.part)

    # Cut018: cut Cylinder049
    add(cylinder049.part, mode=Mode.SUBTRACT)

    # Cut020: cut Fusion068
    add(fusion068_2.part, mode=Mode.SUBTRACT)


with BuildPart() as cut_holder_basex_1:
    # Cut020 placement: moved
    add(cut_holder_basex.part.moved(Location((75, 0, -16))).rotate(Axis((75, 0, -16), (0, 1, 0)), CUT020_PLACEMENT_ANGLE))

    # Fusion083: union Cube027
    add(cube027.part)

    # Fillet008
    fillet008_edges = [cut_holder_basex_1.edges().sort_by_distance(p)[0] for p in [
        (6, 4.75, -18.647511),
    ]]
    fillet(fillet008_edges, radius=FILLET008_R)

    # Fillet010
    fillet010_edges = [cut_holder_basex_1.edges().sort_by_distance(p)[0] for p in [
        (14.786686, 4.75, -20.515179),
    ]]
    fillet(fillet010_edges, radius=FILLET010_R)

    # Cut037: cut Cylinder067 body
    add(cylinder067_body_2.part, mode=Mode.SUBTRACT)

    # Cut040: cut Cube029
    add(cube029.part, mode=Mode.SUBTRACT)

    # Cut042: cut mounting-holes
    add(mounting_holes_2.part, mode=Mode.SUBTRACT)

    # Chamfer004
    chamfer004_edges = [cut_holder_basex_1.edges().sort_by_distance(p)[0] for p in [
        (31.3, 2.5, -24),
        (15.3, 2.5, -24),
    ]]
    chamfer(chamfer004_edges, length=CHAMFER004_SIZE)


solid = cut_holder_basex_1.part
